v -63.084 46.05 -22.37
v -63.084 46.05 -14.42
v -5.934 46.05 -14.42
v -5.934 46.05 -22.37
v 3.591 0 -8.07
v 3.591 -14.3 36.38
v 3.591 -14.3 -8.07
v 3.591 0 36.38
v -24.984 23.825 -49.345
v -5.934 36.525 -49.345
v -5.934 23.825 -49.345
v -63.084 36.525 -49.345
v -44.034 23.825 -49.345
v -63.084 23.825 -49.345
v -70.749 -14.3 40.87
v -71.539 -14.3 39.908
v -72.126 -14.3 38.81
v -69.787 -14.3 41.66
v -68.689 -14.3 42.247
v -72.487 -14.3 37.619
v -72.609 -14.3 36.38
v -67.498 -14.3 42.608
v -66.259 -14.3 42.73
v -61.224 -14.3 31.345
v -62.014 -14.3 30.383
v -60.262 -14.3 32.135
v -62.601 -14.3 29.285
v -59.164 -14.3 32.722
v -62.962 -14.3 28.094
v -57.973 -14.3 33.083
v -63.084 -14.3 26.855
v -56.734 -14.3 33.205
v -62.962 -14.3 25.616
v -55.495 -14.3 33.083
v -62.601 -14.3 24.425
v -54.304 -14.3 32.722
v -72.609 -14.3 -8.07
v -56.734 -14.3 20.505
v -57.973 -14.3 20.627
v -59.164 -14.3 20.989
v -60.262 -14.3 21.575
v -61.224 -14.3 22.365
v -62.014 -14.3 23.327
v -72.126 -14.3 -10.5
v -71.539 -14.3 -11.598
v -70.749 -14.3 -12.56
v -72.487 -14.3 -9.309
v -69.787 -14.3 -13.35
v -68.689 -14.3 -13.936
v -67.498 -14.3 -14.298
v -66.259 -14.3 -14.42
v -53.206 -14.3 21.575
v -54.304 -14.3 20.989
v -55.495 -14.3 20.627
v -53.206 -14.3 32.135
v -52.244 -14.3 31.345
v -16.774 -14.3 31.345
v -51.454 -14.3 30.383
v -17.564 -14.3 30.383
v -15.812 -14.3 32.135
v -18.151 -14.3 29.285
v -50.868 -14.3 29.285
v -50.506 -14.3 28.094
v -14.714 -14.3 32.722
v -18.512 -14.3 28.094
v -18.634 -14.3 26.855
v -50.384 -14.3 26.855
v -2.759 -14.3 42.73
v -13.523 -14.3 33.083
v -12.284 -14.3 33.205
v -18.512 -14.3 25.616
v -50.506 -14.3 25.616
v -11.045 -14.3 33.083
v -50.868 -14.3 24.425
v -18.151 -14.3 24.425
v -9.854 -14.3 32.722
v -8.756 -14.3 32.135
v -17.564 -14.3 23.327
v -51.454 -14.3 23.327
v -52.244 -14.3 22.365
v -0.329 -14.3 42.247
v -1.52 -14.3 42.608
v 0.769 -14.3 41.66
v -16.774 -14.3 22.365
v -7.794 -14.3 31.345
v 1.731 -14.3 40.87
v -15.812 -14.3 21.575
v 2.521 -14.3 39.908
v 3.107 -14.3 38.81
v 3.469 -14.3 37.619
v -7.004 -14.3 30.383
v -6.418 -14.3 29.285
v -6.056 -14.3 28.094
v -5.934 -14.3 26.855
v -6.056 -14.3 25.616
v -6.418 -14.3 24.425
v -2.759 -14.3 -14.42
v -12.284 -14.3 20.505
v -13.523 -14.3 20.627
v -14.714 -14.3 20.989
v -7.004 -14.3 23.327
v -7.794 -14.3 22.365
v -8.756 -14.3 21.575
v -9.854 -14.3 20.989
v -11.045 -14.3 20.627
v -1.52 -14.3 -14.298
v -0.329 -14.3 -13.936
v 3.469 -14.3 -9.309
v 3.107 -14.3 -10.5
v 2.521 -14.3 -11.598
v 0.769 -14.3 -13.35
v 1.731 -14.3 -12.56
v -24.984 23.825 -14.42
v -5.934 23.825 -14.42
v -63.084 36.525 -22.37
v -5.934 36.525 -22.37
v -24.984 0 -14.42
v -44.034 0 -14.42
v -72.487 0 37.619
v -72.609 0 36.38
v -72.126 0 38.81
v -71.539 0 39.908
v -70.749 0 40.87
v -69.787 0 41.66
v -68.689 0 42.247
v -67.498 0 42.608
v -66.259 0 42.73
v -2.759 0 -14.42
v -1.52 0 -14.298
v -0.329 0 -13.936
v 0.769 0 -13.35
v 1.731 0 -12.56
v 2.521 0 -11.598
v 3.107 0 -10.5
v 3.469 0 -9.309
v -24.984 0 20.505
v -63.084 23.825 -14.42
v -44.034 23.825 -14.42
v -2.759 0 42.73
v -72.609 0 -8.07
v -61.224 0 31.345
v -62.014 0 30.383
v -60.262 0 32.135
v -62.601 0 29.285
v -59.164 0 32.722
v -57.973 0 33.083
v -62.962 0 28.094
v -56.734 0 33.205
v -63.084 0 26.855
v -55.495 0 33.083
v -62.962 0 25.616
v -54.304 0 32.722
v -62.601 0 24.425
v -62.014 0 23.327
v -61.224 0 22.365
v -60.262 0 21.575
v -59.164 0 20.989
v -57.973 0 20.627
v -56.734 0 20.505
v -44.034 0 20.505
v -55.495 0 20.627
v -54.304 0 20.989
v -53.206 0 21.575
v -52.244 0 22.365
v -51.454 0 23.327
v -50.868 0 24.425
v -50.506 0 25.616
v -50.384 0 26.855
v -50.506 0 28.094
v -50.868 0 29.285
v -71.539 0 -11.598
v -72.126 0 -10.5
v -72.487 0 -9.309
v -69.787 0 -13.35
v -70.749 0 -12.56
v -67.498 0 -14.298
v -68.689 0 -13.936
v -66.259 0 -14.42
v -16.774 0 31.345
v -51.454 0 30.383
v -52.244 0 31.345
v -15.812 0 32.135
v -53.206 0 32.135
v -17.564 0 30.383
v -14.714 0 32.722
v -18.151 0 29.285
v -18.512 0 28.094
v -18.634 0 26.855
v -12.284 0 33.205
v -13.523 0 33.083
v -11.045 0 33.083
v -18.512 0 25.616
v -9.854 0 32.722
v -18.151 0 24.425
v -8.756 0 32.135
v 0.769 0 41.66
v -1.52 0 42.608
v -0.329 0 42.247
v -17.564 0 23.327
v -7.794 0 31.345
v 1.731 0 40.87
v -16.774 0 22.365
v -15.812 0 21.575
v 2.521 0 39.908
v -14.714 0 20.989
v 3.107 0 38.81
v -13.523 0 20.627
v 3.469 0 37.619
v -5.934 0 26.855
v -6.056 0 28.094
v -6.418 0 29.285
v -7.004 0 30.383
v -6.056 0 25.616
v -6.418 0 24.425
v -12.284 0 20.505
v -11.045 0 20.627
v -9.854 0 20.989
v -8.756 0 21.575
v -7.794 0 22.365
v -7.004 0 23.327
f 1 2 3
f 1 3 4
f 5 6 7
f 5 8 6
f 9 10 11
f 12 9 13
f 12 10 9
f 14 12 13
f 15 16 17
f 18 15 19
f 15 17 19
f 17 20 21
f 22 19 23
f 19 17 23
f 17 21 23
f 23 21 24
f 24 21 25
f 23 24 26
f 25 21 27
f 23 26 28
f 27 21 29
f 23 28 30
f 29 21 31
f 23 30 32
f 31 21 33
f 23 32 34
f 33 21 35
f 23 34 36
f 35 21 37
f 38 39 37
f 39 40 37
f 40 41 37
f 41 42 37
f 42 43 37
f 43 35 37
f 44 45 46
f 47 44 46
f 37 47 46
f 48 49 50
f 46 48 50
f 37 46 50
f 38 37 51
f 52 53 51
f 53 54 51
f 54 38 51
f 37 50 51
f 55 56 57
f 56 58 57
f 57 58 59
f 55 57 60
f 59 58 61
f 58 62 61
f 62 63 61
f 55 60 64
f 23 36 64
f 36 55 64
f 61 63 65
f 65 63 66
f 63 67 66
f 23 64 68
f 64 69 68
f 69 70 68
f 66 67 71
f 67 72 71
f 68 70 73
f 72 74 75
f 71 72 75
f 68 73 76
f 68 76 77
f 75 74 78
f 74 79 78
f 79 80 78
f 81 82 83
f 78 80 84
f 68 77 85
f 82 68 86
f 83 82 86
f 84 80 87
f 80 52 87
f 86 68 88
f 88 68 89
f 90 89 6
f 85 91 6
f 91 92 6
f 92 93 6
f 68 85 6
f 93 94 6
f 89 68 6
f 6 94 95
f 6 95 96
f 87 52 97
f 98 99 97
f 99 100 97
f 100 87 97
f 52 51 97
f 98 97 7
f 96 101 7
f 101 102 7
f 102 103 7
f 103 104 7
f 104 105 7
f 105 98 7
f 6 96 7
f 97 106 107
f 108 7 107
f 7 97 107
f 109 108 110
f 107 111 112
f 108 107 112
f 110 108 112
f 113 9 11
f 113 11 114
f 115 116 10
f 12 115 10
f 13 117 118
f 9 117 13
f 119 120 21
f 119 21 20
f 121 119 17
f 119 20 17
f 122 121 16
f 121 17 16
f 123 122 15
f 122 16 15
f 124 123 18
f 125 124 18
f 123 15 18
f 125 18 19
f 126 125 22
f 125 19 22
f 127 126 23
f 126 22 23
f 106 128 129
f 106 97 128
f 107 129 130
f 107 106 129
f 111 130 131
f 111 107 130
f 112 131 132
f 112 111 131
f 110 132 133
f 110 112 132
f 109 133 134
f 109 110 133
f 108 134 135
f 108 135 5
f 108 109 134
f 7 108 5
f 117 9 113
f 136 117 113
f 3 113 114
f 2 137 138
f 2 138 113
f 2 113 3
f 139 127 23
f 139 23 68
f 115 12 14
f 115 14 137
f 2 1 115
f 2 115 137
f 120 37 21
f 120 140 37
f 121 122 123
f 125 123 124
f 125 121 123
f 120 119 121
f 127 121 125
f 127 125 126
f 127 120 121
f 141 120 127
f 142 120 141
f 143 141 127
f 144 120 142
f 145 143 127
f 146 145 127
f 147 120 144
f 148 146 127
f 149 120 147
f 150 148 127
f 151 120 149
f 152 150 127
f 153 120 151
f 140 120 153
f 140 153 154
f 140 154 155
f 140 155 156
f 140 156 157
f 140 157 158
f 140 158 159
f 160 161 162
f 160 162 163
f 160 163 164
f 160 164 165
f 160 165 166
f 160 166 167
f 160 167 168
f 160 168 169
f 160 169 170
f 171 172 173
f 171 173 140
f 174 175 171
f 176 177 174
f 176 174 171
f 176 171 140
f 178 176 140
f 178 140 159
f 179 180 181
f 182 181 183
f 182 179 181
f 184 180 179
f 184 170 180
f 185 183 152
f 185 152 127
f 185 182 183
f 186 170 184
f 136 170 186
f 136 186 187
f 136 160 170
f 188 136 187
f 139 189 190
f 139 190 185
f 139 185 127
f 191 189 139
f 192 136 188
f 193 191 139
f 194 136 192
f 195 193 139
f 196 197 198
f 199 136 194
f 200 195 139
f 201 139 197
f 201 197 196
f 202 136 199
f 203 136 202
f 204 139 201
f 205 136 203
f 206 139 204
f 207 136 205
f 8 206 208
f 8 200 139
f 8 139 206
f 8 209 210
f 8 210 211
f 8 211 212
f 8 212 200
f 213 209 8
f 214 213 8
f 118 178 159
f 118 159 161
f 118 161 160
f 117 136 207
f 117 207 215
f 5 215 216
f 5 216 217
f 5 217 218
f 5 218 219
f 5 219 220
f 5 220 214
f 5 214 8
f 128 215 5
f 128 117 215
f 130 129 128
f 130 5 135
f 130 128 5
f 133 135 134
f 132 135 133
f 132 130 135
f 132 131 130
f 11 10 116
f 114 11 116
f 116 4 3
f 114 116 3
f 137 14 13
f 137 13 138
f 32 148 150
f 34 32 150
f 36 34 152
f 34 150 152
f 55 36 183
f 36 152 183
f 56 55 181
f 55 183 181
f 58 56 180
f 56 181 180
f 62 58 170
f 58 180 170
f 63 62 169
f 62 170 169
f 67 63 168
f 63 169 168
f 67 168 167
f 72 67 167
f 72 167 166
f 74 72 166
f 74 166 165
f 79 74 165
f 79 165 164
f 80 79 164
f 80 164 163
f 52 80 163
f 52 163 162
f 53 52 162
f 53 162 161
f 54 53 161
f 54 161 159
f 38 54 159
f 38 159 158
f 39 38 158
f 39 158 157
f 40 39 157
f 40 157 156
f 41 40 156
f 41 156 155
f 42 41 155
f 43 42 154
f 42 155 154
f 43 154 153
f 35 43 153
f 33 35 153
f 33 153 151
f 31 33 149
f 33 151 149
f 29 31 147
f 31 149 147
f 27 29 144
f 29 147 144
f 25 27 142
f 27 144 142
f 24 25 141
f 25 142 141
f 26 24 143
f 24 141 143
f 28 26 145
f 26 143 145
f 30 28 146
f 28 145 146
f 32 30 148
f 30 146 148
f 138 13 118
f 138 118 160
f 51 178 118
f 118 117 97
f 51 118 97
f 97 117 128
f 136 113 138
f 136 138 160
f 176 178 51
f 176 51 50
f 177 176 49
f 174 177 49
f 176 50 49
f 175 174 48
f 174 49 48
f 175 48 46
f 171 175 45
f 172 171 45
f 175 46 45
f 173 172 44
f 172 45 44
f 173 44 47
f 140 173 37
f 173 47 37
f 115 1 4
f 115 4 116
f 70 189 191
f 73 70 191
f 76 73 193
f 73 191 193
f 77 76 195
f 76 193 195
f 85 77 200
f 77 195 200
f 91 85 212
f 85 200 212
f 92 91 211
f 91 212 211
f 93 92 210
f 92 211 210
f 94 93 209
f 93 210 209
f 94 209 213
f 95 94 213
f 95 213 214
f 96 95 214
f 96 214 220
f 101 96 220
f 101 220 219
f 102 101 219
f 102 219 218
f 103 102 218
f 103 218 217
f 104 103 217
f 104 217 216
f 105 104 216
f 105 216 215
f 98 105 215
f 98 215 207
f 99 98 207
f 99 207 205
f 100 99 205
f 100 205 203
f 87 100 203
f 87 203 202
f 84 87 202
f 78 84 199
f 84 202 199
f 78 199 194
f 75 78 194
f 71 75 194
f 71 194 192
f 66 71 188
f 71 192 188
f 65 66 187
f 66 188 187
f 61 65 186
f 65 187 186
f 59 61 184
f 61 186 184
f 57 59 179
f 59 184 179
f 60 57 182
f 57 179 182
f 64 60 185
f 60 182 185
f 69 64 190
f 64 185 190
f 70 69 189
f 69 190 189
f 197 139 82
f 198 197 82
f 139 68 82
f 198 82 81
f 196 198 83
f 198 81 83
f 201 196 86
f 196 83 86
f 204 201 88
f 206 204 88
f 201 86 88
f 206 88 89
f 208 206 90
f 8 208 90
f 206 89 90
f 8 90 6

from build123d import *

# Parameters (mm, degrees)
SKETCH1_R               = 6.35
SKETCH1_W               = 19.05
SKETCH1_H               = 25.985863096
EXTRUDE2_DEPTH          = 14.3002
SKETCH2_W               = 19.05
SKETCH2_H               = 69.85
EXTRUDE3_DEPTH          = 23.8252
CUT_EXTRUDE1_DEPTH      = 73.599512703
CUT_EXTRUDE1_DEPTH_BACK = 73.599512703
CUT_EXTRUDE2_START      = -19.05
CUT_EXTRUDE2_DEPTH      = 19.05
EXTRUDE4_DEPTH          = 19.05
EXTRUDE4_DEPTH_BACK     = 38.1
FILLET1_R               = 6.35


# Read off the part's stored shape, not the designer's step: Cut-Extrude2
with BuildPart() as part:
    # Sketch1 → Extrude2 (new body)
    # profile 1 of 2: a face of its own
    with BuildSketch(Plane(origin=(0, 0, 0), x_dir=(1, 0, 0), z_dir=(0, 1, 0))):
        Polygon((-44.03422619, -11.566071429), (-44.03422619, 14.419791667), (-72.60922619, 14.419791667), (-72.60922619, -42.730208333), (3.59077381, -42.730208333), (3.59077381, 14.419791667), (-24.98422619, 14.419791667), (-24.98422619, -11.566071429), align=None)
        with Locations(Location((-56.73422619, -26.855208333, 0), (0, 0, 270))):
            Circle(SKETCH1_R, mode=Mode.SUBTRACT)
        with Locations(Location((-12.28422619, -26.855208333, 0), (0, 0, 270))):
            Circle(SKETCH1_R, mode=Mode.SUBTRACT)
    # profile 2 of 2: a face of its own
    with BuildSketch(Plane(origin=(0, 0, 0), x_dir=(1, 0, 0), z_dir=(0, 1, 0))):
        with Locations((-34.50922619, 1.426860119)):
            Rectangle(SKETCH1_W, SKETCH1_H)
    extrude(amount=-EXTRUDE2_DEPTH)

    # Sketch2 → Extrude3 (add)
    with BuildSketch(Plane(origin=(0, 0, 0), x_dir=(-1, 0, 0), z_dir=(0, 1, 0))):
        with Locations((34.50922619, -14.419791667)):
            Rectangle(SKETCH2_W, SKETCH2_H)
    extrude(amount=EXTRUDE3_DEPTH)

    # Sketch3 → Cut-Extrude1 (cut, two sides: drawn at the far end of the back side and taken through both)
    with BuildSketch(Plane.ZY.offset(44.03422619).offset(-CUT_EXTRUDE1_DEPTH_BACK)):
        Polygon((20.505208333, 23.8252), (-14.419791667, 23.8252), (20.505208333, 0), align=None)
    extrude(amount=CUT_EXTRUDE1_DEPTH + CUT_EXTRUDE1_DEPTH_BACK, mode=Mode.SUBTRACT)

    # Cut-Extrude2 outline → Cut-Extrude2 (cut)
    with BuildSketch(Plane.ZY.offset(44.03422619).offset(CUT_EXTRUDE2_START)):
        Polygon((-49.344791667, 0), (-14.419791667, 0), (-49.344791667, 23.8252), align=None)
    extrude(amount=CUT_EXTRUDE2_DEPTH, mode=Mode.SUBTRACT)

    # Sketch5 → Extrude4 (add, two sides: drawn at the far end of the back side and taken through both)
    with BuildSketch(Plane(origin=(-24.98422619, 0, -14.419791667), x_dir=(0, 0, -1), z_dir=(1, 0, 0)).offset(-EXTRUDE4_DEPTH_BACK)):
        Polygon((0, 23.8252), (0, 46.0502), (7.9502, 46.0502), (7.9502, 36.5252), (34.925, 36.5252), (34.925, 23.8252), align=None)
    extrude(amount=EXTRUDE4_DEPTH + EXTRUDE4_DEPTH_BACK)

    # Fillet1
    fillet1_edges = [part.edges().sort_by_distance(p)[0] for p in [
        (3.59077381, -7.1501, 42.730208333),
        (-72.60922619, -7.1501, 42.730208333),
        (-72.60922619, -7.1501, -14.419791667),
        (3.59077381, -7.1501, -14.419791667),
    ]]
    fillet(fillet1_edges, radius=FILLET1_R)


solid = part.part
